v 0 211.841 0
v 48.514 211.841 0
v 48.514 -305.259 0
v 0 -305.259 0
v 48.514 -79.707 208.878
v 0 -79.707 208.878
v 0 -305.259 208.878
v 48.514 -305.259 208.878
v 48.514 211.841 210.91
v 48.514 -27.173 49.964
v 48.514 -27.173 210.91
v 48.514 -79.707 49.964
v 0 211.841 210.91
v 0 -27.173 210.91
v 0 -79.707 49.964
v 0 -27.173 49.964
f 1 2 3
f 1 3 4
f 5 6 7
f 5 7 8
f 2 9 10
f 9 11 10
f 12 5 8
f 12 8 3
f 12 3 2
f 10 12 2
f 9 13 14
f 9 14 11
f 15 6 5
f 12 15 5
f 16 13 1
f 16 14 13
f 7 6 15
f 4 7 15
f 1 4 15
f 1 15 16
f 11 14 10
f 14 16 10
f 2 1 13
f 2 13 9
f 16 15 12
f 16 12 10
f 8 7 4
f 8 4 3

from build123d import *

# Parameters (mm, degrees)
F0_W       = 52.5342468172
F0_H       = 49.9637834728
F1_DEPTH   = 48.514
F2_W       = 48.514
F2_H       = 24.9818917364
F3_DEPTH   = 46.99
F4_W       = 48.514
F4_H       = 24.9818917364
F5_DEPTH   = 49.53
F6_W       = 48.514
F6_H       = 49.53
F7_DEPTH   = 45.72
F8_W       = 48.514
F8_H       = 46.99
F9_DEPTH   = 45.974
F10_W      = 48.514
F10_H      = 46.99
F11_DEPTH  = 137.922
F12_DEPTH  = 140.208
F13_W      = 48.514
F13_H      = 208.8778917364
F14_DEPTH  = 153.162
F15_W      = 48.514
F15_H      = 208.8778917364
F12_FACE_W = 48.514
F12_FACE_H = 210.9098917364
F16_DEPTH  = 25.4
F17_DEPTH  = 189.484


with BuildPart() as f1:
    # F0 (on Right) → F1 (new body)
    with BuildSketch(Plane.YZ):
        with Locations((-53.4399999306, 24.9818917364)):
            Rectangle(F0_W, F0_H)
    extrude(amount=F1_DEPTH)

    # F2 (on face) → F3 (join)
    with BuildSketch(Plane.XZ.offset(79.7071233392)):
        with Locations((24.257, 12.4909458682)):
            Rectangle(F2_W, F2_H)
    extrude(amount=F3_DEPTH)

    # F4 (on face) → F5 (join)
    with BuildSketch(Plane(origin=(0, -27.1728765219, 0), x_dir=(-1, 0, 0), z_dir=(0, 1, 0))):
        with Locations((-24.257, 12.4909458682)):
            Rectangle(F4_W, F4_H)
    extrude(amount=F5_DEPTH)

    # F6 (on face) → F7 (join)
    with BuildSketch(Plane.XY.offset(24.9818917364)):
        with Locations((24.257, -2.4078765219)):
            Rectangle(F6_W, F6_H)
    extrude(amount=F7_DEPTH)

    # F8 (on face) → F9 (join)
    with BuildSketch(Plane.XY.offset(24.9818917364)):
        with Locations((24.257, -103.2021233392)):
            Rectangle(F8_W, F8_H)
    extrude(amount=F9_DEPTH)

    # F10 (on face) → F11 (join)
    with BuildSketch(Plane.XY.offset(70.9558917364)):
        with Locations((24.257, -103.2021233392)):
            Rectangle(F10_W, F10_H)
    extrude(amount=F11_DEPTH)

    # F12 (add): a face of the model
    f12_faces = [f1.faces().sort_by_distance(p)[0] for p in [
        (24.257, -2.4078765219, 70.7018917364),
    ]]
    extrude(f12_faces, amount=F12_DEPTH)

    # F13 (on face) → F14 (join)
    with BuildSketch(Plane.XZ.offset(126.6971233392)):
        with Locations((24.257, 104.4389458682)):
            Rectangle(F13_W, F13_H)
    extrude(amount=F14_DEPTH)

    # F15 (on face) + F12_face (on face) → F16 (join)
    with BuildSketch(Plane.XZ.offset(279.8591233392)):
        with Locations((24.257, 104.4389458682)):
            Rectangle(F15_W, F15_H)
    with BuildSketch(Plane(origin=(24.257, 22.3571234781, 105.4549458682), x_dir=(-1, 0, 0), z_dir=(0, 1, 0))):
        Rectangle(F12_FACE_W, F12_FACE_H)
    extrude(amount=F16_DEPTH, dir=(0, -1, 0))

    # F17 (add): a face of the model
    f17_faces = [f1.faces().sort_by_distance(p)[0] for p in [
        (24.257, 22.3571234781, 105.4549458682),
    ]]
    extrude(f17_faces, amount=F17_DEPTH)


solid = f1.part
